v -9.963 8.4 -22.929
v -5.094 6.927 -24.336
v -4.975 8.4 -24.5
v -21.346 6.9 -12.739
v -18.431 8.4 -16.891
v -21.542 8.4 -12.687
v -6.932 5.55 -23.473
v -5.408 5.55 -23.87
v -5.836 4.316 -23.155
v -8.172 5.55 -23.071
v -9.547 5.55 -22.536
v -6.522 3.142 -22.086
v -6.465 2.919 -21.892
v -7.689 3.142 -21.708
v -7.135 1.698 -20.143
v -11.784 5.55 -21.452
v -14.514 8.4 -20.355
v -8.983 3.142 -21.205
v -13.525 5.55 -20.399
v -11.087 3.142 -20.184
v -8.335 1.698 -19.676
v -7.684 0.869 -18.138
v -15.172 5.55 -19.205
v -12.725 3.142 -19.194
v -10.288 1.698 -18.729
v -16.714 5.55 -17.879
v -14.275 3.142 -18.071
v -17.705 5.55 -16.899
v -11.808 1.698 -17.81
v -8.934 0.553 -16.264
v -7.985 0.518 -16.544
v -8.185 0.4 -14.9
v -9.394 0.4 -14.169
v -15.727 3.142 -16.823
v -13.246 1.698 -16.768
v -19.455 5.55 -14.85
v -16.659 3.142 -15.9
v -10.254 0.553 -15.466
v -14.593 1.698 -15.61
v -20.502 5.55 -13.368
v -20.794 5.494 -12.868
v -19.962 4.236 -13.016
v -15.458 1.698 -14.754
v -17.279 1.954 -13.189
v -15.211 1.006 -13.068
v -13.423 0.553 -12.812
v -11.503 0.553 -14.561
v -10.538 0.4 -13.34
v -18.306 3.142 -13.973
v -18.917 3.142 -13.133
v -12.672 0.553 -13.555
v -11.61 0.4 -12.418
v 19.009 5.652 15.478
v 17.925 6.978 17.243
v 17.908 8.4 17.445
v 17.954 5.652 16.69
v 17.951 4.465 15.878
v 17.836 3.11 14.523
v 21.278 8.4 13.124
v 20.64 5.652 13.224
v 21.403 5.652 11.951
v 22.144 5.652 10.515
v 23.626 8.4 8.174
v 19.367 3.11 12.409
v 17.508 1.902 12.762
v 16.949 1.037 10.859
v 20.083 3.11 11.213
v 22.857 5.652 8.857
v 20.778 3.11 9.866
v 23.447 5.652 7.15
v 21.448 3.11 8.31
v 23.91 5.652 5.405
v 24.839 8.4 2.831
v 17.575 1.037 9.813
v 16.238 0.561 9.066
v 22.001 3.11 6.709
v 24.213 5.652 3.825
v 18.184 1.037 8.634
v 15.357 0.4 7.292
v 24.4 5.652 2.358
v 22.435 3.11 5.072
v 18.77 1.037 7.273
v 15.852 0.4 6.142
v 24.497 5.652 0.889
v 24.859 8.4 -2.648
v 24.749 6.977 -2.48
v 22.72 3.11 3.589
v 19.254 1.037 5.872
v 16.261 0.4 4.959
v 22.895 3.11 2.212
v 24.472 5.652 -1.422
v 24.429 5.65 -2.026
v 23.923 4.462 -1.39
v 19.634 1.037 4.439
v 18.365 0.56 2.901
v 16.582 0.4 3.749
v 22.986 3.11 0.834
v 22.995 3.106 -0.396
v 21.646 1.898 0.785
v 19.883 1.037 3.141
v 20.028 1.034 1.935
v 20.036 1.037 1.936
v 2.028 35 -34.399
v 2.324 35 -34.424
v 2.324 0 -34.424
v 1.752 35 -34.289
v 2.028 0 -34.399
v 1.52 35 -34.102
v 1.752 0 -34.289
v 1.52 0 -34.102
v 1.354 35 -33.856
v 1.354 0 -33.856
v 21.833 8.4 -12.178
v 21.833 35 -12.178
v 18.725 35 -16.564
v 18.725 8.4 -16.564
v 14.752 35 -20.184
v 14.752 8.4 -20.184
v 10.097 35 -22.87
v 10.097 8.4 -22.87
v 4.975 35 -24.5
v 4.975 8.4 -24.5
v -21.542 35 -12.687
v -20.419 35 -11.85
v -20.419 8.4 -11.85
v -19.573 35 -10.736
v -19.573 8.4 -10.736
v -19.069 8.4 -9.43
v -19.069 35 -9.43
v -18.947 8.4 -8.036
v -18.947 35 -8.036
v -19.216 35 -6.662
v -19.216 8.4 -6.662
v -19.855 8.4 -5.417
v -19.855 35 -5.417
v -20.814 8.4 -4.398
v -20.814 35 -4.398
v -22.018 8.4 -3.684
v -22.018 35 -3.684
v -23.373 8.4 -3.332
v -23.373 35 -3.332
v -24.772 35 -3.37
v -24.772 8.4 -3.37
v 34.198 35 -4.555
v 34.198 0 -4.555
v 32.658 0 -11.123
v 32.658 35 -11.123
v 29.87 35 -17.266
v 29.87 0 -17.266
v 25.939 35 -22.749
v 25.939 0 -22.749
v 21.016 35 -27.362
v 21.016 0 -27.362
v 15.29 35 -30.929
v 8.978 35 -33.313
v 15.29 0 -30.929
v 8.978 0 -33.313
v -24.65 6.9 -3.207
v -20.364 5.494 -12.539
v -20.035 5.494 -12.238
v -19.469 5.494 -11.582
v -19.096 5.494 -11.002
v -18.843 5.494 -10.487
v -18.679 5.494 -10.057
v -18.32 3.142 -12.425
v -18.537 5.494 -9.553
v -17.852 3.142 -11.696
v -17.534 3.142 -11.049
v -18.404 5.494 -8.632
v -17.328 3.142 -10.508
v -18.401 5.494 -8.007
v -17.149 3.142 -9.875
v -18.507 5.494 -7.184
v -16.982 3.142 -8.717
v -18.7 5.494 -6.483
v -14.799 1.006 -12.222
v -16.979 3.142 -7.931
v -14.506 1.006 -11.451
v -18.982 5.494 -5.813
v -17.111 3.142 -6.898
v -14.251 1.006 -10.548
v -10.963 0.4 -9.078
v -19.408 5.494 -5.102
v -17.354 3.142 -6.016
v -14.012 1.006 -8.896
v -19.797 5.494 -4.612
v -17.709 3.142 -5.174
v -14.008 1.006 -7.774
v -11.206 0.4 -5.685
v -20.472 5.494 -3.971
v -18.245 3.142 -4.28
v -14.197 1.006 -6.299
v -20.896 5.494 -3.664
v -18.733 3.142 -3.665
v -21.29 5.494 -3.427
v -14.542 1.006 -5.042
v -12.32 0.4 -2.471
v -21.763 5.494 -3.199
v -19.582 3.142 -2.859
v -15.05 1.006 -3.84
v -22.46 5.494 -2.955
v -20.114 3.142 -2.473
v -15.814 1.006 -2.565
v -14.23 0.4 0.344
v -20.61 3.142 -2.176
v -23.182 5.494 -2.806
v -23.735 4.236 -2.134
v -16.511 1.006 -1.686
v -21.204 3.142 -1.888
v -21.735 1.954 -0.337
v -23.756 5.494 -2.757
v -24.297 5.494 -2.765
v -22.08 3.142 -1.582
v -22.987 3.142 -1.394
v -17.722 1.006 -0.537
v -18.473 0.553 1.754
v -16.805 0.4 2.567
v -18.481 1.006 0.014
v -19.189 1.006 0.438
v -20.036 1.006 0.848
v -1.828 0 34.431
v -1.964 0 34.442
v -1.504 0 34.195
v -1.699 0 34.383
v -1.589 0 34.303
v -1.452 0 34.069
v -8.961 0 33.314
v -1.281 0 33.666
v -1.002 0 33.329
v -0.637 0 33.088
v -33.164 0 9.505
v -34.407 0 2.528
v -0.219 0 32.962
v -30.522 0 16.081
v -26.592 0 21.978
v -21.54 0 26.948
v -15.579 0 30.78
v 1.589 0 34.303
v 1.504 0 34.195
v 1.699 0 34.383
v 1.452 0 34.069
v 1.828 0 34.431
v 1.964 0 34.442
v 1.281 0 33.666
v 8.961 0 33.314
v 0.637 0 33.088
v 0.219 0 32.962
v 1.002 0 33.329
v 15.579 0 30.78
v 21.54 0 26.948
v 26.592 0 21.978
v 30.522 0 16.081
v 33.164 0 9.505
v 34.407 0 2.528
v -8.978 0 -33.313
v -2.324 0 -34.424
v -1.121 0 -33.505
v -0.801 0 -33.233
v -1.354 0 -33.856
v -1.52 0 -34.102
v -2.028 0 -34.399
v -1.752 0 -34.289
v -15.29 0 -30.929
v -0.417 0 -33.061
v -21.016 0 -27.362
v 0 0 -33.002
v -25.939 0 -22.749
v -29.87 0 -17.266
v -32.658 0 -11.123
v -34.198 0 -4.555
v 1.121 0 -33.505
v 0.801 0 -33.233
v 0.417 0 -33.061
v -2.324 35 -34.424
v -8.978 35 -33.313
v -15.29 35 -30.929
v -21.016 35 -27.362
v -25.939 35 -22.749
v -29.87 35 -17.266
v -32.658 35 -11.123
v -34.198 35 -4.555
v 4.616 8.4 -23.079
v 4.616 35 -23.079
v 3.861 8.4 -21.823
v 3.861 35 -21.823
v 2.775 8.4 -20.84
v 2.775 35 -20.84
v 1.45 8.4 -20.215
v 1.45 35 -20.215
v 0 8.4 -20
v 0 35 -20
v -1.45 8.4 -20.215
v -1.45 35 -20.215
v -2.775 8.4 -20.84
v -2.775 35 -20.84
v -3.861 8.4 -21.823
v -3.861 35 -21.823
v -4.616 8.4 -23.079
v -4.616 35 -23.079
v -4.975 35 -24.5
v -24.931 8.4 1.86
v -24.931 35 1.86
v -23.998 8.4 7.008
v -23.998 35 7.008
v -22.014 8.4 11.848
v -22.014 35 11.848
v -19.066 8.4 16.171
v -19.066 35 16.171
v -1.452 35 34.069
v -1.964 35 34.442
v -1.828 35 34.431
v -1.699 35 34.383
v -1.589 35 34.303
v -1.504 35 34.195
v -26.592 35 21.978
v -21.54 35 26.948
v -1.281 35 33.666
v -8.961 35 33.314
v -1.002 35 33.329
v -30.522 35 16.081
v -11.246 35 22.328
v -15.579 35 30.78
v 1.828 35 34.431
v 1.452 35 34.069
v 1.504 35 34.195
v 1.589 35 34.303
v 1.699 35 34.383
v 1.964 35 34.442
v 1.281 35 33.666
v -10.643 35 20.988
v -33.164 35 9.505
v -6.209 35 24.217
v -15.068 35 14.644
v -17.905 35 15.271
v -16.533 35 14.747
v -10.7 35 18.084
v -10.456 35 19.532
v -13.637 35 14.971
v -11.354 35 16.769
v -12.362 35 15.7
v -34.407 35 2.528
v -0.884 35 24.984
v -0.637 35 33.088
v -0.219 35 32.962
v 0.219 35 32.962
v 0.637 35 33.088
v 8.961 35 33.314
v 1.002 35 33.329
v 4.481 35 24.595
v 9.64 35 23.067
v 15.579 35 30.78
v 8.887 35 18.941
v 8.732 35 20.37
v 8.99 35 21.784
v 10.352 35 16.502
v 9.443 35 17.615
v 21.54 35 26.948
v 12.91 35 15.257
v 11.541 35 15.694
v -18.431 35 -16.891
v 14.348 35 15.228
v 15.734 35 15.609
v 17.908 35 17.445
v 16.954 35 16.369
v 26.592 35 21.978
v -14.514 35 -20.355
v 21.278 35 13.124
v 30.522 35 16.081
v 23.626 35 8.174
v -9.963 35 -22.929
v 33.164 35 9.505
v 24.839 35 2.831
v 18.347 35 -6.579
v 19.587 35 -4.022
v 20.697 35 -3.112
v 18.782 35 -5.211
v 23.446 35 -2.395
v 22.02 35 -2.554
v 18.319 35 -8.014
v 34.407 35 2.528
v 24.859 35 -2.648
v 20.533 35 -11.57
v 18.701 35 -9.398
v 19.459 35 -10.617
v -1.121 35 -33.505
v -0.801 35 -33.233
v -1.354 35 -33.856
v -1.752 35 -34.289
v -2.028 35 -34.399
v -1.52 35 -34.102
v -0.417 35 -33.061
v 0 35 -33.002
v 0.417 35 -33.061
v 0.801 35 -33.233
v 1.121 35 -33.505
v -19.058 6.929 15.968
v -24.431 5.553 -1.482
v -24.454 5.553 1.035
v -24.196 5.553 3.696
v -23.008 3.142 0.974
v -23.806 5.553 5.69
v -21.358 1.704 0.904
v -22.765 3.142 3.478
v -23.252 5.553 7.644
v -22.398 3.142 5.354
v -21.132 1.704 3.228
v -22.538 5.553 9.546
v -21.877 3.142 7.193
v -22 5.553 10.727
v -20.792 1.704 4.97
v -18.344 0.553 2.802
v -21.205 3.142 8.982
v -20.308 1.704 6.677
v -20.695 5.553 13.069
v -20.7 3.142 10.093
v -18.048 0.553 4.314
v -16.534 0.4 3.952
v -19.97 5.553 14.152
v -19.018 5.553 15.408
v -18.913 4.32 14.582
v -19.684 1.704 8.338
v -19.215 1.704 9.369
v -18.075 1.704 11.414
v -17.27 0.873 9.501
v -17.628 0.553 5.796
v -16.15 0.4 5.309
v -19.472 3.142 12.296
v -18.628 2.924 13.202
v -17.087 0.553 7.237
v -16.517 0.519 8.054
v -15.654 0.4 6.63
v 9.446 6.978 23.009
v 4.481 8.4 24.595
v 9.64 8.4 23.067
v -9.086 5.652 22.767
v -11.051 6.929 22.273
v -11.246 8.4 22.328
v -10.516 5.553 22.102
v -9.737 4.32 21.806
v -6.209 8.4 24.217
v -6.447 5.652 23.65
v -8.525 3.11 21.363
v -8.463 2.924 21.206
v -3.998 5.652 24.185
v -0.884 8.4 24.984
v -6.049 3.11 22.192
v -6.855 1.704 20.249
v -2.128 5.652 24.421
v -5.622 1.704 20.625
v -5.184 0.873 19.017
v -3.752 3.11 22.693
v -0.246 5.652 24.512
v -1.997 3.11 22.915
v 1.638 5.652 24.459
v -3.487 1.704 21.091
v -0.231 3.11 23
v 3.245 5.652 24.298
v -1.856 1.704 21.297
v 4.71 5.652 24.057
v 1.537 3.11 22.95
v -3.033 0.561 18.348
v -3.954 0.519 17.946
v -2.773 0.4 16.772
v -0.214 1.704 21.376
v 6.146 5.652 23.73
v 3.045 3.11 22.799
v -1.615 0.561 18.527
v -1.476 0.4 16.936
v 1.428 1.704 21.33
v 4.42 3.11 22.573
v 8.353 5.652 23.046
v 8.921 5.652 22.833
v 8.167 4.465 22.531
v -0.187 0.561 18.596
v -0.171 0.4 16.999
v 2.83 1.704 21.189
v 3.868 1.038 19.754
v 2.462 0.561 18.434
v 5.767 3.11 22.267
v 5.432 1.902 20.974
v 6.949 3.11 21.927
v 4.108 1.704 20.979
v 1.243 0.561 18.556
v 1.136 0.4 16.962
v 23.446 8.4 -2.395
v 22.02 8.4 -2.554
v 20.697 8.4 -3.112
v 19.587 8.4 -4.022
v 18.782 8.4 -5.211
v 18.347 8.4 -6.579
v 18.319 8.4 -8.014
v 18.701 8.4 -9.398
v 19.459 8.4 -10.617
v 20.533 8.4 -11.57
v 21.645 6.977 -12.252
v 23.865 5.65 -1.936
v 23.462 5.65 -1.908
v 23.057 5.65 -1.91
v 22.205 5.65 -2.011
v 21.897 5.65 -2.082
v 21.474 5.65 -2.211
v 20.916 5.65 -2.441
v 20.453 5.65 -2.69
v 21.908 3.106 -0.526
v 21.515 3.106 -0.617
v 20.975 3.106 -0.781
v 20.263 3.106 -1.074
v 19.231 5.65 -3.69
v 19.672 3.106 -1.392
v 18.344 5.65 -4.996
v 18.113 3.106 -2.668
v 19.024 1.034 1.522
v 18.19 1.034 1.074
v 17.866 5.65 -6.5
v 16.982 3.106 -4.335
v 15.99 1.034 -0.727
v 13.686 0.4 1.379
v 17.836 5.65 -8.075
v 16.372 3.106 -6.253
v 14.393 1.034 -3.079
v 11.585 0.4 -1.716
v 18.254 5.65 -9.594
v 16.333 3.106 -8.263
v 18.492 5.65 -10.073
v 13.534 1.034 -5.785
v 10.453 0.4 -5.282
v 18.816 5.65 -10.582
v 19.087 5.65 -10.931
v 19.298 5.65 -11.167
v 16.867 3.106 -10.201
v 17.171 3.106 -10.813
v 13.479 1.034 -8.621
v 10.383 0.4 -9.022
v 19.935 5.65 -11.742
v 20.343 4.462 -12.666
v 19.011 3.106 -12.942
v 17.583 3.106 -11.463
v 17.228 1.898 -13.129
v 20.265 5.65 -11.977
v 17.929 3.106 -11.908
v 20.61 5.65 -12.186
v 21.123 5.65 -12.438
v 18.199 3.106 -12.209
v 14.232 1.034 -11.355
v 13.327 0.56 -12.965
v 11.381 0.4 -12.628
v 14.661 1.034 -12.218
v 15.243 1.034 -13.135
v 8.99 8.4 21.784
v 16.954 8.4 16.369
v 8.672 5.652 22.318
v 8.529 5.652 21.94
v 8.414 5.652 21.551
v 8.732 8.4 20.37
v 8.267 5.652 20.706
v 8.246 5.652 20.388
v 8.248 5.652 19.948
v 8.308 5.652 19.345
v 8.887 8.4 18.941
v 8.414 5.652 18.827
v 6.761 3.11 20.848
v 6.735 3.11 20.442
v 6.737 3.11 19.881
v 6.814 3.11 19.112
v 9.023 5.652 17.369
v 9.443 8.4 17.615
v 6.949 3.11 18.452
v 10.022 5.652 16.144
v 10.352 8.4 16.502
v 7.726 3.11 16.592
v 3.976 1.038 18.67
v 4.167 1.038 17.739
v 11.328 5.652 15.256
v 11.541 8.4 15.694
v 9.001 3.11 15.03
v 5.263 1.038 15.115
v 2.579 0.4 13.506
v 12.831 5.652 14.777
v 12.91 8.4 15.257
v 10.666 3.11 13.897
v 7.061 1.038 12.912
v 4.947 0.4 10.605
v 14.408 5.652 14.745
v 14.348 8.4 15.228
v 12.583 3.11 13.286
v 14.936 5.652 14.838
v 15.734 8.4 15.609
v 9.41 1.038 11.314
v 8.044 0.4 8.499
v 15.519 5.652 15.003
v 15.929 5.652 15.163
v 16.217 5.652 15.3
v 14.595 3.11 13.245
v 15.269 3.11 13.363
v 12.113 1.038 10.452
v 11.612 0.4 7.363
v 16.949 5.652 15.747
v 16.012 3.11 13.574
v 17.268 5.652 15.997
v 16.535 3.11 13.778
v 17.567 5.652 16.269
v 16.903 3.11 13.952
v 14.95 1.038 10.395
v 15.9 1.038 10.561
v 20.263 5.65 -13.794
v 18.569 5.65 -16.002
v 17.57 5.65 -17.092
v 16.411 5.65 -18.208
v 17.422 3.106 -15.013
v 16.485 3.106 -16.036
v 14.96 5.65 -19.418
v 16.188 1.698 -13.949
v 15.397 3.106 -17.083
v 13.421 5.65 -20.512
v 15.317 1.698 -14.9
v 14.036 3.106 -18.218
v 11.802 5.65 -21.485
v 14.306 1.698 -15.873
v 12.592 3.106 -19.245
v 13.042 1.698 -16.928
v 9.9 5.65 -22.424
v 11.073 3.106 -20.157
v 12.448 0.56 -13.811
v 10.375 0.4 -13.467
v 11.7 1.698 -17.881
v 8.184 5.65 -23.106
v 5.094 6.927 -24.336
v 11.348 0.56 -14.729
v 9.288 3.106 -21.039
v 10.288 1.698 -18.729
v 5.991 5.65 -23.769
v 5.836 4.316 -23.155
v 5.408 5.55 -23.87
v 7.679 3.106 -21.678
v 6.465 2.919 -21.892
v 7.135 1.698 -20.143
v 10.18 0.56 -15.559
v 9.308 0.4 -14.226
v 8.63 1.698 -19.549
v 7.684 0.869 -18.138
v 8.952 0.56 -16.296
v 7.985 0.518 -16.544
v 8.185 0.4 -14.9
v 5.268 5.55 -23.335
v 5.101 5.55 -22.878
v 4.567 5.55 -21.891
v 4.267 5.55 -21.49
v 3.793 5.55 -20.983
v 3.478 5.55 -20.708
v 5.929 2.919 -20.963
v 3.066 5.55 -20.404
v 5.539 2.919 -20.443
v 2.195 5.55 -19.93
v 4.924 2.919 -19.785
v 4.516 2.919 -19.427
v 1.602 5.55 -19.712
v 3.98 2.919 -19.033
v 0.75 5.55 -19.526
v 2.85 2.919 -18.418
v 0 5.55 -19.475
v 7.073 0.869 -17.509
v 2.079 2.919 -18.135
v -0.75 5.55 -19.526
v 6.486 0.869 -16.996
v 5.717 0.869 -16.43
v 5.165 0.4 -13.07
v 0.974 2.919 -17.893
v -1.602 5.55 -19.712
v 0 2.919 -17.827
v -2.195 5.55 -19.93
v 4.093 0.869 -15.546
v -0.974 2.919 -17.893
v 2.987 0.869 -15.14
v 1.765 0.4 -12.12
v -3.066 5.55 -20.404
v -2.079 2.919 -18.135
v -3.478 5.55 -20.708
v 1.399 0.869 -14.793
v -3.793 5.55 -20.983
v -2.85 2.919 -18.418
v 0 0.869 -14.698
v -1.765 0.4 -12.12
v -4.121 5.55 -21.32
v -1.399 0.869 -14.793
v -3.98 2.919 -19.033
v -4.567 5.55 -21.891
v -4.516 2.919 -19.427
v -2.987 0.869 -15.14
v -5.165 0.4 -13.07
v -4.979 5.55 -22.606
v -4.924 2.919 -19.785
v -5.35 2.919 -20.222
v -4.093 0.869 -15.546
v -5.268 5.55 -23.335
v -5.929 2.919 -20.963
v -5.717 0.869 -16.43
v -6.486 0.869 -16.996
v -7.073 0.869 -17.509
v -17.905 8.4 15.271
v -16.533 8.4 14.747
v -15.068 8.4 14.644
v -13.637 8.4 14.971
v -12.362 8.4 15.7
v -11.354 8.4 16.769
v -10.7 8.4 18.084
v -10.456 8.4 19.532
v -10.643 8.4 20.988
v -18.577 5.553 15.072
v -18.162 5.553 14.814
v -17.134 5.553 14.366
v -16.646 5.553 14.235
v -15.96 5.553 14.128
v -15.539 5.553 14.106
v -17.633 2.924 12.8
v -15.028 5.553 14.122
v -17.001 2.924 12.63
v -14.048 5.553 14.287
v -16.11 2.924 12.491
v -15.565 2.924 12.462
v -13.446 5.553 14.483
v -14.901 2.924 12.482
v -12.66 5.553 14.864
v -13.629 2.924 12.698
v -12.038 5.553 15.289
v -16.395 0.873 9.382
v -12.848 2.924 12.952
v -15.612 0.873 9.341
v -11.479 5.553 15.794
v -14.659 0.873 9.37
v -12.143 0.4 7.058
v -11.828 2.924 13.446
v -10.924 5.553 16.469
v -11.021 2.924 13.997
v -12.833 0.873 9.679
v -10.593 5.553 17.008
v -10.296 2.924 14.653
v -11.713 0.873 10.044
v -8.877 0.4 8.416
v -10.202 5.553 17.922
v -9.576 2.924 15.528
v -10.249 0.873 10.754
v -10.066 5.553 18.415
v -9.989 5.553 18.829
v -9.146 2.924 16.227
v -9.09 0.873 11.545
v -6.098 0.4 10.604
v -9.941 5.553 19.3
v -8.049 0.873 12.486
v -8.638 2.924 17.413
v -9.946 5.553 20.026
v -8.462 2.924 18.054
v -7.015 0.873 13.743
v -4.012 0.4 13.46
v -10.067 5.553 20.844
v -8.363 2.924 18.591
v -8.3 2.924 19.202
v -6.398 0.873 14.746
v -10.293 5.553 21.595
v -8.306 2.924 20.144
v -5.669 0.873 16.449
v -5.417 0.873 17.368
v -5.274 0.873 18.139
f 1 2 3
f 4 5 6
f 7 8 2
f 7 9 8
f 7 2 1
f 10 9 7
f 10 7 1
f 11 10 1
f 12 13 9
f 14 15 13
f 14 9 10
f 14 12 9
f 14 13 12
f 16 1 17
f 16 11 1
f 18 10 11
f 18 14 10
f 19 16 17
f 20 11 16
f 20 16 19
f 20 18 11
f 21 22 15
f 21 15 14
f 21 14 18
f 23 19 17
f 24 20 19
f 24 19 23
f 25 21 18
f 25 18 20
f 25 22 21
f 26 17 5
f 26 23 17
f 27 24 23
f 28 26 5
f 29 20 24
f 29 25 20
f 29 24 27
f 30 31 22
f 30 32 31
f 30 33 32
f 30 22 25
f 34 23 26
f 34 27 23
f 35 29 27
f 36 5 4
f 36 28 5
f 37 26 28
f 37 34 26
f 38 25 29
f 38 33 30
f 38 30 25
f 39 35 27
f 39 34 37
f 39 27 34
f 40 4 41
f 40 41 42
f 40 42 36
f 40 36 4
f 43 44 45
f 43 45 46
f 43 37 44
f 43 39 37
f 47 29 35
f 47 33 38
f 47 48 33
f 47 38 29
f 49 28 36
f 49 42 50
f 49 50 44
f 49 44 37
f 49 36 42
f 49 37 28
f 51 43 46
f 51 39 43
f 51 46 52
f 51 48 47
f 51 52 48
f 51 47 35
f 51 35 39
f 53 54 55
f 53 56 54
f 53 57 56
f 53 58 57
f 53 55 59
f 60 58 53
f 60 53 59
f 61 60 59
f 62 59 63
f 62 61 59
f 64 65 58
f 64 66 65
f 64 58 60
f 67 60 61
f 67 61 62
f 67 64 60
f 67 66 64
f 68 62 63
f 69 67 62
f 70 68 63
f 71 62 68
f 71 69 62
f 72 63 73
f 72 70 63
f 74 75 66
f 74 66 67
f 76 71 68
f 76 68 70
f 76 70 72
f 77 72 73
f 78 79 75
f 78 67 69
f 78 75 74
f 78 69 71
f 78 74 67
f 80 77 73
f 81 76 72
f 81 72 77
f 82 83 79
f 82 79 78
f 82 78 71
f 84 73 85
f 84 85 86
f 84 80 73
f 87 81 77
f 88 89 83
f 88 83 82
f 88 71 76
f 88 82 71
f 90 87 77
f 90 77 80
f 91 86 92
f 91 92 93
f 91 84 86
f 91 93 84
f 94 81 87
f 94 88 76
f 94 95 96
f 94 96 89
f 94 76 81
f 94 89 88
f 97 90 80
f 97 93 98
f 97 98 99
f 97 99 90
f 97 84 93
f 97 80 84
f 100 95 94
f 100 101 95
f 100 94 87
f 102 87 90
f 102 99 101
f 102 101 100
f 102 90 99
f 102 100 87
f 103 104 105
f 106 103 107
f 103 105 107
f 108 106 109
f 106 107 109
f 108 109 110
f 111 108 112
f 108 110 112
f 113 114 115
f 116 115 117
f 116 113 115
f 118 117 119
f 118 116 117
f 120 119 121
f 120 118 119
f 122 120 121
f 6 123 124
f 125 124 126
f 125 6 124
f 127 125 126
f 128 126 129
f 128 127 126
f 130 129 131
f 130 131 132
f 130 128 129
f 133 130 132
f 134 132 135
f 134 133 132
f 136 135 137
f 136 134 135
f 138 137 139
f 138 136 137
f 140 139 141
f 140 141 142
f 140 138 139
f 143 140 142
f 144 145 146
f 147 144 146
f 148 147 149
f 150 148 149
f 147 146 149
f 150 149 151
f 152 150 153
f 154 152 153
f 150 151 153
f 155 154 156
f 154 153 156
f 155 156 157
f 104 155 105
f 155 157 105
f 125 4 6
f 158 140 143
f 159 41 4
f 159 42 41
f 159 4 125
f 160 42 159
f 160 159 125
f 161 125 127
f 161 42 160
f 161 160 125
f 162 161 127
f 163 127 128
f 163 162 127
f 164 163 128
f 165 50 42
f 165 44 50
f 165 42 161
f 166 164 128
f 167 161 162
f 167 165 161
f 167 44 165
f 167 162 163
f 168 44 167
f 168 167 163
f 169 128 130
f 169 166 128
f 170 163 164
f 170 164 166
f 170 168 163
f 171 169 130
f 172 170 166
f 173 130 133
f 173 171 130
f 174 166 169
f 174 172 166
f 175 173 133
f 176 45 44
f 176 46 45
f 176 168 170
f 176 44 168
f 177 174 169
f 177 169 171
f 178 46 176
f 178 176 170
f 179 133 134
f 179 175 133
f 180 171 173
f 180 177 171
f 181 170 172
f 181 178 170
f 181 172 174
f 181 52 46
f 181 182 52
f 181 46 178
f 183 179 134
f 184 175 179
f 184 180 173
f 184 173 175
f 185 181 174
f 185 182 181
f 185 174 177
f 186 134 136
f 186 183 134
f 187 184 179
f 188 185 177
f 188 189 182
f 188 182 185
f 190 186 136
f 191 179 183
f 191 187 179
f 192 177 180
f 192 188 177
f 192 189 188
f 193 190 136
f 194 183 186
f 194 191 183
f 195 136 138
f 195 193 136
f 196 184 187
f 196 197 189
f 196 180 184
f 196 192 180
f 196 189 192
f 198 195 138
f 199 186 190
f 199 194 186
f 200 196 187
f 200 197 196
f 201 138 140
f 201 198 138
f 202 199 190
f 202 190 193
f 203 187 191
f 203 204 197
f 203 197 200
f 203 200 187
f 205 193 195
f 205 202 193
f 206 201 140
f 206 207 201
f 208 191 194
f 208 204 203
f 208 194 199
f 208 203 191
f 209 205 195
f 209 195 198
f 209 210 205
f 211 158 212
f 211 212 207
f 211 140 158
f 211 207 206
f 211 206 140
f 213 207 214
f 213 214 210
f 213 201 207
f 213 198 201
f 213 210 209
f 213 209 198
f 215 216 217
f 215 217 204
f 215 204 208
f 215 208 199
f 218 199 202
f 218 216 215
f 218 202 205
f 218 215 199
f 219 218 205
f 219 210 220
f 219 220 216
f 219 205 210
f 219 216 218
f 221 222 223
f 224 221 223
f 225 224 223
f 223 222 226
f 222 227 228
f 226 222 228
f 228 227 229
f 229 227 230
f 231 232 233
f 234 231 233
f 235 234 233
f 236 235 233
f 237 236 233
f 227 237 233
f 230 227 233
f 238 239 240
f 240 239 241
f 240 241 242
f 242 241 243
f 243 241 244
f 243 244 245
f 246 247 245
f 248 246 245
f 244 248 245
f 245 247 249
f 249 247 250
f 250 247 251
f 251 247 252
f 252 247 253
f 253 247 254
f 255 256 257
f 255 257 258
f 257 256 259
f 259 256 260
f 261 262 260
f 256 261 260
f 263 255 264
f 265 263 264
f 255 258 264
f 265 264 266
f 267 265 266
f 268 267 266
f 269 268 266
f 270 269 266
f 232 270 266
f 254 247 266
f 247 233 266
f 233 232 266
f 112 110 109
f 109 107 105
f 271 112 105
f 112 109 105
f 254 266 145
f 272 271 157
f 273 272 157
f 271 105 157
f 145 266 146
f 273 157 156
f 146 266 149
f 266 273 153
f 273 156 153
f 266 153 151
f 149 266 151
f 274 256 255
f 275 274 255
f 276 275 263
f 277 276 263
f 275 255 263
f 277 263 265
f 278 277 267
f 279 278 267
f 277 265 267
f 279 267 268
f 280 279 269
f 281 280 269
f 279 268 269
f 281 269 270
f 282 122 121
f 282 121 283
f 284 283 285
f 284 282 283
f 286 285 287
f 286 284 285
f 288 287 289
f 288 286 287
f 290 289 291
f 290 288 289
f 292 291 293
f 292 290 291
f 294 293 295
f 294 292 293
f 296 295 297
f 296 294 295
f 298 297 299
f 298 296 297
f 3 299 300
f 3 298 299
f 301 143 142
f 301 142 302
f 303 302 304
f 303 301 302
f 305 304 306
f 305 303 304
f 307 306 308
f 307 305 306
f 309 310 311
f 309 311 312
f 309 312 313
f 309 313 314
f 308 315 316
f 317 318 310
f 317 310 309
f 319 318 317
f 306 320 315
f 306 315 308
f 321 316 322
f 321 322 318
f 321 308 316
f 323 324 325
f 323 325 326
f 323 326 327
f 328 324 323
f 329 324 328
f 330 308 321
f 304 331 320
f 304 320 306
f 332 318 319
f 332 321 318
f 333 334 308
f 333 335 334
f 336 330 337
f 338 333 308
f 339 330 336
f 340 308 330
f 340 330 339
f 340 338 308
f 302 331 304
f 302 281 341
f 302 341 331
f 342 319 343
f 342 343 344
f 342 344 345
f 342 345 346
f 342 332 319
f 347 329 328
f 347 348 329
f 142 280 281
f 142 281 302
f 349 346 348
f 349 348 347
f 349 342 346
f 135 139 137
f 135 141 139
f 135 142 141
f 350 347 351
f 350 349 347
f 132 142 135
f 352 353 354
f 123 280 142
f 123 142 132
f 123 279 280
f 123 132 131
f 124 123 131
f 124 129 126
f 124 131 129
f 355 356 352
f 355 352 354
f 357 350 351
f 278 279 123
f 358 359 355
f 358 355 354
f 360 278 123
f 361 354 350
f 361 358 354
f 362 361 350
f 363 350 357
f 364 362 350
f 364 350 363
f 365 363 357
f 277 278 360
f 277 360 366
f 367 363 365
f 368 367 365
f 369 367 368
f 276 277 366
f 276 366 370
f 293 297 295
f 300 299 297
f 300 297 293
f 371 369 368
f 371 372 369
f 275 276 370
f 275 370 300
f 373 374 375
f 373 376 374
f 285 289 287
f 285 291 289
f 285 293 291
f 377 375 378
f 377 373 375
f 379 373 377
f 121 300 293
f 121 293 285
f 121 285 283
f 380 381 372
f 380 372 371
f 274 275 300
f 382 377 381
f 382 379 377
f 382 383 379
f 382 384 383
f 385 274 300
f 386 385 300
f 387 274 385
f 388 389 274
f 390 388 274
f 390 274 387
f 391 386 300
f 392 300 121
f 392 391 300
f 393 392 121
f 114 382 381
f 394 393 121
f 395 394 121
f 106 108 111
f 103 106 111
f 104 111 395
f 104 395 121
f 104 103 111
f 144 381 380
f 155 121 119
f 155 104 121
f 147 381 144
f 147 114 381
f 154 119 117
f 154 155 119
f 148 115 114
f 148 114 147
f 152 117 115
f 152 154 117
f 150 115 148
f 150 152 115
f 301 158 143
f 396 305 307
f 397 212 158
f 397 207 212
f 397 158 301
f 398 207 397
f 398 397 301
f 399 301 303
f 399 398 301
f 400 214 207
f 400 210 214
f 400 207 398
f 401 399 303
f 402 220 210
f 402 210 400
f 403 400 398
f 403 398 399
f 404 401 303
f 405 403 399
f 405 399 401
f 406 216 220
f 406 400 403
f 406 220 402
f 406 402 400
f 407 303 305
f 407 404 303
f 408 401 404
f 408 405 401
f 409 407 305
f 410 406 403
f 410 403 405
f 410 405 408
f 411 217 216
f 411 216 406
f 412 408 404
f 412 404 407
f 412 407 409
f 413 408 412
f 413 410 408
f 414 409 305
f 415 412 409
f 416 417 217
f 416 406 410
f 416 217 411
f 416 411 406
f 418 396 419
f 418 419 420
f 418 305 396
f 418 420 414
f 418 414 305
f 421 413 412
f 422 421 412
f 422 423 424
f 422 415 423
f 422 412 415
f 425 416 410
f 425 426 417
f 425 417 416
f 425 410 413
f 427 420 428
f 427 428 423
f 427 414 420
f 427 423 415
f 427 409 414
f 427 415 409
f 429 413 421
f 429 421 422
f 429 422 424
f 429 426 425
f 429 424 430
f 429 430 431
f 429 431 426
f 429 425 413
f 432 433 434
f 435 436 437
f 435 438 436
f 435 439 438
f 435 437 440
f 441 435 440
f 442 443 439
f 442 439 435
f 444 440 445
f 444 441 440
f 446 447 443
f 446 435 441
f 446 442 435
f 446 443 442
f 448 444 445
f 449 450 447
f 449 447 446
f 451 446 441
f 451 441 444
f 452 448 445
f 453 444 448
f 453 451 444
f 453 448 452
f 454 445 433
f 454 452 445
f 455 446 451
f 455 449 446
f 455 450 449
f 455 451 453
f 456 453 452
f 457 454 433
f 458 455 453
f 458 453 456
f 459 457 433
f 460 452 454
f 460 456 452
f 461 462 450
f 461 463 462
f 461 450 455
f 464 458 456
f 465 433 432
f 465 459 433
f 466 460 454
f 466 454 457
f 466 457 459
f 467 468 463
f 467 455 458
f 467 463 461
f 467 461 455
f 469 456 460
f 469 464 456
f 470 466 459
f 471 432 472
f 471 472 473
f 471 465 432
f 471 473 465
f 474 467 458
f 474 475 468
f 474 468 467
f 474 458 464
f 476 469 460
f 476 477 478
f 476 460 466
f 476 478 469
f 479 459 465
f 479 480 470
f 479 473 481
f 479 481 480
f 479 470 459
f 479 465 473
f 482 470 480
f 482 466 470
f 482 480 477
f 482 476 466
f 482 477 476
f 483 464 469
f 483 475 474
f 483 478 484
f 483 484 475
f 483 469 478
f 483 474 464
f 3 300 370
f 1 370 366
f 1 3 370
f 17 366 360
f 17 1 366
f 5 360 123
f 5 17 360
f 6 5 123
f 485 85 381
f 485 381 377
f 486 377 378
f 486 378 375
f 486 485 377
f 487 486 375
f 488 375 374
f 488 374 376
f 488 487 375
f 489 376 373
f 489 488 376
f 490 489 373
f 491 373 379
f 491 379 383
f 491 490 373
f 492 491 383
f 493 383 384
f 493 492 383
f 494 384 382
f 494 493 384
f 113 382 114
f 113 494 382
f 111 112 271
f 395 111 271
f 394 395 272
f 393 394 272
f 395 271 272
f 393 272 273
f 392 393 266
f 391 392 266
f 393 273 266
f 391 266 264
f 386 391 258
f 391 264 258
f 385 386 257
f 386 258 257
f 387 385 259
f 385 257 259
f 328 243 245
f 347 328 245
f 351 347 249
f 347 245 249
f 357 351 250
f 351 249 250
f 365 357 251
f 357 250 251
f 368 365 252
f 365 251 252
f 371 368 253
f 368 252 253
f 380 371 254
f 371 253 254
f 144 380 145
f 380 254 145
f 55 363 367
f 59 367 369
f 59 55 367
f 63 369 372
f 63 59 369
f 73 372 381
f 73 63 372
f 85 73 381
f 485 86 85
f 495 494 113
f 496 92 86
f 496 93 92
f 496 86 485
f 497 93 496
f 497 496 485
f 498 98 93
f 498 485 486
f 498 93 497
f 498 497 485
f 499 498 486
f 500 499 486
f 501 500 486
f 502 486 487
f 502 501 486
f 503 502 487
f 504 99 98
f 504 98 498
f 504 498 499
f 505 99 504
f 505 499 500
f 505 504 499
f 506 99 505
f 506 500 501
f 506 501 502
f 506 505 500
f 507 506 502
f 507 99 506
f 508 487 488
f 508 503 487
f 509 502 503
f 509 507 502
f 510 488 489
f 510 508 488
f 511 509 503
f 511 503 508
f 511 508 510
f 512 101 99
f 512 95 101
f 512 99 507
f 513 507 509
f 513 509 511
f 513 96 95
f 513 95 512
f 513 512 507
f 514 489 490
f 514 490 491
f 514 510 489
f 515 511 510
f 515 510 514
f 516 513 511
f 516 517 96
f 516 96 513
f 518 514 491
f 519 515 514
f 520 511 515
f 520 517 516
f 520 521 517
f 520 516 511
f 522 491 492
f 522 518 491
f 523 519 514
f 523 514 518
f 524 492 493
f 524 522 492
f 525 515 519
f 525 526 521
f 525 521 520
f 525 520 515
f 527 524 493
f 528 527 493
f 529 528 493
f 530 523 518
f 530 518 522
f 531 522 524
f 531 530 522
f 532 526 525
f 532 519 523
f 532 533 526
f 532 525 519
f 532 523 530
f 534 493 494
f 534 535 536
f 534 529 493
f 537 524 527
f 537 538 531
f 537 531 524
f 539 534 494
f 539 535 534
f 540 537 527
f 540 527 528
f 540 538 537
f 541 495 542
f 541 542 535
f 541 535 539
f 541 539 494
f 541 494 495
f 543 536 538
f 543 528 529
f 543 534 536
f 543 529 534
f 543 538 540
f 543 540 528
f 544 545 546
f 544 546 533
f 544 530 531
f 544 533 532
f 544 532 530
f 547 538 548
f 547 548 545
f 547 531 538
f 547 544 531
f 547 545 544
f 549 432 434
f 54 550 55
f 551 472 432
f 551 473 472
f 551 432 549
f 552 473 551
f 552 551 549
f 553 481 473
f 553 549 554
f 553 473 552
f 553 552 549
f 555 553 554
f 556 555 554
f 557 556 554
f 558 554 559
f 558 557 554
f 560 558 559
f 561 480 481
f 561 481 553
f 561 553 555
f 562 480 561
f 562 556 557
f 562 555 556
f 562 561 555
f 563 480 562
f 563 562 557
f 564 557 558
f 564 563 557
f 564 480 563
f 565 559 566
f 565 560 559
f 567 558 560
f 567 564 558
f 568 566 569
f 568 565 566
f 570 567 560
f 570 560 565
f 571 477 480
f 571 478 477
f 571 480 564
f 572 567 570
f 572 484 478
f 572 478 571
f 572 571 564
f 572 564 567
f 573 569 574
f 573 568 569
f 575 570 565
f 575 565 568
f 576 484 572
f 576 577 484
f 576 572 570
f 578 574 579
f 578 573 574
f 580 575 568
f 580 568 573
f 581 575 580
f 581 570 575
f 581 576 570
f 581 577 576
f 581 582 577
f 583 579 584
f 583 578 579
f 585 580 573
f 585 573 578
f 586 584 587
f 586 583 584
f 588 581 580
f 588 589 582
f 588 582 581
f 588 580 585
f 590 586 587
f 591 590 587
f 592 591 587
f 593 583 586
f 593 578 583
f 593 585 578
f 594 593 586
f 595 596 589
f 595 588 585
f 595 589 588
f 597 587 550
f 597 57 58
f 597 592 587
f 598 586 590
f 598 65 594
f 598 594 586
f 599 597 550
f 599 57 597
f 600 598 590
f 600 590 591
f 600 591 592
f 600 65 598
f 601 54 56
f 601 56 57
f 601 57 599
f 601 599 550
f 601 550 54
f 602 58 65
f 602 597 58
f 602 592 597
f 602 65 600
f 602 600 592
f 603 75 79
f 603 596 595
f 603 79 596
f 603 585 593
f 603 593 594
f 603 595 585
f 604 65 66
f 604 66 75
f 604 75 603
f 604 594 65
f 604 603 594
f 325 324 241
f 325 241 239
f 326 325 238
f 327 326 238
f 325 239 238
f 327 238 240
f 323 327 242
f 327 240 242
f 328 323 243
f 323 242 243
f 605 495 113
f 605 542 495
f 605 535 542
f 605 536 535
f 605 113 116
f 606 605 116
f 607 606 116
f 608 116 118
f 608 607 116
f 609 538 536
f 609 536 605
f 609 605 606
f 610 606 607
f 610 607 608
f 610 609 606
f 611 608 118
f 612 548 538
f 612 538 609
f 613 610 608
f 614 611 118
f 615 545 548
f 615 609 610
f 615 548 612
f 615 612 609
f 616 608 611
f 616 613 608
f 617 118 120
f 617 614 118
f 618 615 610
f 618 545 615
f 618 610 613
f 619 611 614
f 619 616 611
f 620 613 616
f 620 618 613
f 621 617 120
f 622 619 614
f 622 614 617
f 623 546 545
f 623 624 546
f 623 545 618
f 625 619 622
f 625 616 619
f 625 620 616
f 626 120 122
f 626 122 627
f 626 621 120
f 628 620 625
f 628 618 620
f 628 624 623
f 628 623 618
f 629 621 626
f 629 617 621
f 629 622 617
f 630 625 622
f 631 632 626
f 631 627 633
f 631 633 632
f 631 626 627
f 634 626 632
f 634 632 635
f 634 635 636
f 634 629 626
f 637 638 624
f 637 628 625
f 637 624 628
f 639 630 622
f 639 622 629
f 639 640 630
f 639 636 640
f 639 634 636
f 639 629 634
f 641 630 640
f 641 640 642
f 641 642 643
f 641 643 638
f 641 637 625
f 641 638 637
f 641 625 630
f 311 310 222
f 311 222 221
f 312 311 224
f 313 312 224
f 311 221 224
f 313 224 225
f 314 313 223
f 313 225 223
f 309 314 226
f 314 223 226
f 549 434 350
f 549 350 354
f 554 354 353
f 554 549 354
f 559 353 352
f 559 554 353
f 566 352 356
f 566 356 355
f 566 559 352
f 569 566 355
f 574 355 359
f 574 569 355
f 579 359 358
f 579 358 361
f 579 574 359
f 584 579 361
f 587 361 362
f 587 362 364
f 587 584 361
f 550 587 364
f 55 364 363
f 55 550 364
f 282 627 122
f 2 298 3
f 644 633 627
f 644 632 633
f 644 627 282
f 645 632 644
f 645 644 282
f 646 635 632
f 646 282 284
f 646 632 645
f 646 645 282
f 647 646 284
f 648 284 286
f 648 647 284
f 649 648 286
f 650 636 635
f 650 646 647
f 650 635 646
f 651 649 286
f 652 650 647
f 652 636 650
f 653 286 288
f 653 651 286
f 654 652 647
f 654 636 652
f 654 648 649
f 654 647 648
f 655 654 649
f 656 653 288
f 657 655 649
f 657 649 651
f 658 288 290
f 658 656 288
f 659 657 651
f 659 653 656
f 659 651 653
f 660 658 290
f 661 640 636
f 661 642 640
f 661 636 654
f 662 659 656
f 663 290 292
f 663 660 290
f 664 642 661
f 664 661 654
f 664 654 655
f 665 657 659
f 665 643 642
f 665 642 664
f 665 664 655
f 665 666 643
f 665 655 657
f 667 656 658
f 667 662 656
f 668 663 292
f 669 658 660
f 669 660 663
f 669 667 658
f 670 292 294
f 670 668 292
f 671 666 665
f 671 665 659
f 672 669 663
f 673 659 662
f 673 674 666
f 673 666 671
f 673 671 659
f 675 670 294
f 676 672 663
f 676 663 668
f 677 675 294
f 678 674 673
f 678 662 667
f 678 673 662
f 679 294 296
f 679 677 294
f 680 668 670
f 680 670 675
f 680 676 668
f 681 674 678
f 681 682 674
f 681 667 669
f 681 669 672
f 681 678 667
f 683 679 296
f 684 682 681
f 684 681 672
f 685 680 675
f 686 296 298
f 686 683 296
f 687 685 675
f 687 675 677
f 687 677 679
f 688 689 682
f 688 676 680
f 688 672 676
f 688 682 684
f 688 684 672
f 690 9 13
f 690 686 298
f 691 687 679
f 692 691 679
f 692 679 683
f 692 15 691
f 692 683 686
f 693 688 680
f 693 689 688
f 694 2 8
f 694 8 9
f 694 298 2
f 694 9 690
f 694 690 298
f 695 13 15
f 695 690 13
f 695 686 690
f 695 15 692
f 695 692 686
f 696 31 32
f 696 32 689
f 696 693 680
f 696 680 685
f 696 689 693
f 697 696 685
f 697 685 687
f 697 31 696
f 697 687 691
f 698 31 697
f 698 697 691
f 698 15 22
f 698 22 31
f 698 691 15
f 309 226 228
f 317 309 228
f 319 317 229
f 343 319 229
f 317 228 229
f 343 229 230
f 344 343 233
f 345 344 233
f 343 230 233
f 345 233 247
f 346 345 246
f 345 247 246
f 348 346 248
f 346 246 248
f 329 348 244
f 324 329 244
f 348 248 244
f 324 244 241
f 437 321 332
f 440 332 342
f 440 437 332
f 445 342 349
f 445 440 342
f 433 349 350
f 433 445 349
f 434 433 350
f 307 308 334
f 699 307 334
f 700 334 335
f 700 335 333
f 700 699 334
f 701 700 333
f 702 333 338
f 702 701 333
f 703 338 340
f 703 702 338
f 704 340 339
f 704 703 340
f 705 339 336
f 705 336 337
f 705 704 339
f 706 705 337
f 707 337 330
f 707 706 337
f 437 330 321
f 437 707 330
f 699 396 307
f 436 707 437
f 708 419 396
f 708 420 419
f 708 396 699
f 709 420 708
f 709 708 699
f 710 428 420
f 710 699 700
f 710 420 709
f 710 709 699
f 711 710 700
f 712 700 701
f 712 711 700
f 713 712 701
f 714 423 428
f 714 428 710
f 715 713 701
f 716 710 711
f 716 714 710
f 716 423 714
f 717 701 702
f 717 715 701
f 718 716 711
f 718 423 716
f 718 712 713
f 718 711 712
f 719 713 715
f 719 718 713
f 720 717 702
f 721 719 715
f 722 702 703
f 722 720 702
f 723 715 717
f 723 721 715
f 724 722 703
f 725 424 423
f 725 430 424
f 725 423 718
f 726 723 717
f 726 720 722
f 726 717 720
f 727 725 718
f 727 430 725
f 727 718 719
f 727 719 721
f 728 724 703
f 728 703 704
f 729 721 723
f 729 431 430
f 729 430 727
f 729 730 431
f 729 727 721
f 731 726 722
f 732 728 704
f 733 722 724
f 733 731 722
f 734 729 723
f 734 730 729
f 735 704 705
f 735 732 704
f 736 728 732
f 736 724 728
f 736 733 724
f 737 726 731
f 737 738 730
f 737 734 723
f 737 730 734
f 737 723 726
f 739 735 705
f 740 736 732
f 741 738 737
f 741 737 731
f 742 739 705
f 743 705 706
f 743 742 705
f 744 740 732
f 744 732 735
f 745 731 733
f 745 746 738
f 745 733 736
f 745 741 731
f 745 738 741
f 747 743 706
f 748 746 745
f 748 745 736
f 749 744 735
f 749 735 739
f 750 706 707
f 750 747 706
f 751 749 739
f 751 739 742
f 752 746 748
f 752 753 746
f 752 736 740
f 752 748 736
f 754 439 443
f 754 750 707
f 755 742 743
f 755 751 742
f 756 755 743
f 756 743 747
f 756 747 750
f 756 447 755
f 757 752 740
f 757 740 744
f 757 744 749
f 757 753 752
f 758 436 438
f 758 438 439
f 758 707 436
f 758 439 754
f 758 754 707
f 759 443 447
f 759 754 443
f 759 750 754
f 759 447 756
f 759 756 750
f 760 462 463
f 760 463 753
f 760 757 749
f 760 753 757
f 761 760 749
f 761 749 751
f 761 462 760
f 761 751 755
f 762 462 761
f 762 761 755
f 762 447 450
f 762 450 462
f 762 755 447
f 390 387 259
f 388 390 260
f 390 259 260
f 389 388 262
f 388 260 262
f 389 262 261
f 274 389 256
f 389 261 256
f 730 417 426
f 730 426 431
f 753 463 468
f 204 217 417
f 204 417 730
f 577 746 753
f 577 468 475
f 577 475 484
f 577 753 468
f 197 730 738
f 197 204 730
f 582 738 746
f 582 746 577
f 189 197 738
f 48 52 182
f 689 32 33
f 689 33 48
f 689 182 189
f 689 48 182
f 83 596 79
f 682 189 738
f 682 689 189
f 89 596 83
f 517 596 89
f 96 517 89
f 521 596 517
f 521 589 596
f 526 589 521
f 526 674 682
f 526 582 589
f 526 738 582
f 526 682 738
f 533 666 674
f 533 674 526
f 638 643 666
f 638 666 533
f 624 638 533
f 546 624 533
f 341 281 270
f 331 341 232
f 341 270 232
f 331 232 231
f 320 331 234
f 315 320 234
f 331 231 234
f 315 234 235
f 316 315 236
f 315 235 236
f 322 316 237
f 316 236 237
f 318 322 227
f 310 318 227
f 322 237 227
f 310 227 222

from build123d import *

# Parameters (mm, degrees)
BOSS_EXTRUDE1_DEPTH = 35
CUT_EXTRUDE2_DEPTH  = 36
BOSS_EXTRUDE2_DEPTH = 0.4
FILLET1_R           = 8


with BuildPart() as part:
    # Sketch1 → Boss-Extrude1 (new body)
    with BuildSketch(Plane(origin=(0, 0, 0), x_dir=(1, 0, 0), z_dir=(0, 1, 0))):
        with BuildLine():
            ThreePointArc((1.451818925, -34.068556857), (1.641248992, -34.346908706), (1.964225605, -34.442038138))
            ThreePointArc((1.964225605, -34.442038138), (26.591847487, -21.978073076), (34.198225299, 4.555174015))
            ThreePointArc((34.198225299, 4.555174015), (23.590291339, 25.176355888), (2.324135821, 34.423627607))
            ThreePointArc((2.324135821, 34.423627607), (1.751838249, 34.289058819), (1.354061739, 33.856153382))
            ThreePointArc((1.354061739, 33.856153382), (0, 33.001534515), (-1.354061739, 33.856153382))
            ThreePointArc((-1.354061739, 33.856153382), (-1.751838249, 34.289058819), (-2.324135821, 34.423627607))
            ThreePointArc((-2.324135821, 34.423627607), (-23.590291339, 25.176355888), (-34.198225299, 4.555174015))
            ThreePointArc((-34.198225299, 4.555174015), (-26.591847487, -21.978073076), (-1.964225605, -34.442038138))
            ThreePointArc((-1.964225605, -34.442038138), (-1.641248992, -34.346908706), (-1.451818925, -34.068556857))
            ThreePointArc((-1.451818925, -34.068556857), (0, -32.945679925), (1.451818925, -34.068556857))
        make_face()
        with BuildLine():
            Line((-2.417, 3.787737139), (0, 3.787737139))
            Line((0, 3.787737139), (2.417, 3.787737139))
            ThreePointArc((2.417, 3.787737139), (0, -4.489512172), (-2.417, 3.787737139))
        make_face(mode=Mode.SUBTRACT)
    extrude(amount=BOSS_EXTRUDE1_DEPTH)

    # Sketch2 → Cut-Extrude2 (cut, through all)
    with BuildSketch(Plane(origin=(0, 0, 0), x_dir=(1, 0, 0), z_dir=(0, 1, 0))):
        with BuildLine():
            ThreePointArc((-24.771875163, 3.369599515), (-23.997809329, -7.007506505), (-19.066036357, -16.170536714))
            ThreePointArc((-19.066036357, -16.170536714), (-12.361903527, -15.700472812), (-11.245933621, -22.327762472))
            ThreePointArc((-11.245933621, -22.327762472), (-0.884127319, -24.984361486), (9.639544373, -23.066841662))
            ThreePointArc((9.639544373, -23.066841662), (10.917339043, -16.055130989), (17.907795118, -17.44450842))
            ThreePointArc((17.907795118, -17.44450842), (23.625967237, -8.17396306), (24.859344713, 2.64820325))
            ThreePointArc((24.859344713, 2.64820325), (18.515062391, 5.879189473), (21.833190005, 12.178333803))
            ThreePointArc((21.833190005, 12.178333803), (14.752111216, 20.18353821), (4.974937186, 24.5))
            ThreePointArc((4.974937186, 24.5), (0, 20), (-4.974937186, 24.5))
            ThreePointArc((-4.974937186, 24.5), (-14.514359509, 20.355180374), (-21.541517866, 12.687119769))
            ThreePointArc((-21.541517866, 12.687119769), (-19.215771141, 6.662052225), (-24.771875163, 3.369599515))
        make_face()
    extrude(amount=CUT_EXTRUDE2_DEPTH, mode=Mode.SUBTRACT)

    # Sketch2<2> → Boss-Extrude2 (add)
    with BuildSketch(Plane(origin=(0, 0, 0), x_dir=(1, 0, 0), z_dir=(0, 1, 0))):
        with BuildLine():
            ThreePointArc((-24.771875163, 3.369599515), (-23.997809329, -7.007506505), (-19.066036357, -16.170536714))
            ThreePointArc((-19.066036357, -16.170536714), (-12.361903527, -15.700472812), (-11.245933621, -22.327762472))
            ThreePointArc((-11.245933621, -22.327762472), (-0.884127319, -24.984361486), (9.639544373, -23.066841662))
            ThreePointArc((9.639544373, -23.066841662), (10.917339043, -16.055130989), (17.907795118, -17.44450842))
            ThreePointArc((17.907795118, -17.44450842), (23.625967237, -8.17396306), (24.859344713, 2.64820325))
            ThreePointArc((24.859344713, 2.64820325), (18.515062391, 5.879189473), (21.833190005, 12.178333803))
            ThreePointArc((21.833190005, 12.178333803), (14.752111216, 20.18353821), (4.974937186, 24.5))
            ThreePointArc((4.974937186, 24.5), (0, 20), (-4.974937186, 24.5))
            ThreePointArc((-4.974937186, 24.5), (-14.514359509, 20.355180374), (-21.541517866, 12.687119769))
            ThreePointArc((-21.541517866, 12.687119769), (-19.215771141, 6.662052225), (-24.771875163, 3.369599515))
        make_face()
    extrude(amount=BOSS_EXTRUDE2_DEPTH)

    # Fillet1
    fillet1_edges = [part.edges().sort_by_distance(p)[0] for p in [
        (14.752111216, 0.4, -20.18353821),
        (0, 0.4, -20),
        (-14.514359509, 0.4, -20.355180374),
        (-19.215771141, 0.4, -6.662052225),
        (-23.997809329, 0.4, 7.007506505),
        (-12.361903527, 0.4, 15.700472812),
        (-0.884127319, 0.4, 24.984361486),
        (10.917339043, 0.4, 16.055130989),
        (23.625967237, 0.4, 8.17396306),
        (18.515062391, 0.4, -5.879189473),
    ]]
    fillet(fillet1_edges, radius=FILLET1_R)


solid = part.part
